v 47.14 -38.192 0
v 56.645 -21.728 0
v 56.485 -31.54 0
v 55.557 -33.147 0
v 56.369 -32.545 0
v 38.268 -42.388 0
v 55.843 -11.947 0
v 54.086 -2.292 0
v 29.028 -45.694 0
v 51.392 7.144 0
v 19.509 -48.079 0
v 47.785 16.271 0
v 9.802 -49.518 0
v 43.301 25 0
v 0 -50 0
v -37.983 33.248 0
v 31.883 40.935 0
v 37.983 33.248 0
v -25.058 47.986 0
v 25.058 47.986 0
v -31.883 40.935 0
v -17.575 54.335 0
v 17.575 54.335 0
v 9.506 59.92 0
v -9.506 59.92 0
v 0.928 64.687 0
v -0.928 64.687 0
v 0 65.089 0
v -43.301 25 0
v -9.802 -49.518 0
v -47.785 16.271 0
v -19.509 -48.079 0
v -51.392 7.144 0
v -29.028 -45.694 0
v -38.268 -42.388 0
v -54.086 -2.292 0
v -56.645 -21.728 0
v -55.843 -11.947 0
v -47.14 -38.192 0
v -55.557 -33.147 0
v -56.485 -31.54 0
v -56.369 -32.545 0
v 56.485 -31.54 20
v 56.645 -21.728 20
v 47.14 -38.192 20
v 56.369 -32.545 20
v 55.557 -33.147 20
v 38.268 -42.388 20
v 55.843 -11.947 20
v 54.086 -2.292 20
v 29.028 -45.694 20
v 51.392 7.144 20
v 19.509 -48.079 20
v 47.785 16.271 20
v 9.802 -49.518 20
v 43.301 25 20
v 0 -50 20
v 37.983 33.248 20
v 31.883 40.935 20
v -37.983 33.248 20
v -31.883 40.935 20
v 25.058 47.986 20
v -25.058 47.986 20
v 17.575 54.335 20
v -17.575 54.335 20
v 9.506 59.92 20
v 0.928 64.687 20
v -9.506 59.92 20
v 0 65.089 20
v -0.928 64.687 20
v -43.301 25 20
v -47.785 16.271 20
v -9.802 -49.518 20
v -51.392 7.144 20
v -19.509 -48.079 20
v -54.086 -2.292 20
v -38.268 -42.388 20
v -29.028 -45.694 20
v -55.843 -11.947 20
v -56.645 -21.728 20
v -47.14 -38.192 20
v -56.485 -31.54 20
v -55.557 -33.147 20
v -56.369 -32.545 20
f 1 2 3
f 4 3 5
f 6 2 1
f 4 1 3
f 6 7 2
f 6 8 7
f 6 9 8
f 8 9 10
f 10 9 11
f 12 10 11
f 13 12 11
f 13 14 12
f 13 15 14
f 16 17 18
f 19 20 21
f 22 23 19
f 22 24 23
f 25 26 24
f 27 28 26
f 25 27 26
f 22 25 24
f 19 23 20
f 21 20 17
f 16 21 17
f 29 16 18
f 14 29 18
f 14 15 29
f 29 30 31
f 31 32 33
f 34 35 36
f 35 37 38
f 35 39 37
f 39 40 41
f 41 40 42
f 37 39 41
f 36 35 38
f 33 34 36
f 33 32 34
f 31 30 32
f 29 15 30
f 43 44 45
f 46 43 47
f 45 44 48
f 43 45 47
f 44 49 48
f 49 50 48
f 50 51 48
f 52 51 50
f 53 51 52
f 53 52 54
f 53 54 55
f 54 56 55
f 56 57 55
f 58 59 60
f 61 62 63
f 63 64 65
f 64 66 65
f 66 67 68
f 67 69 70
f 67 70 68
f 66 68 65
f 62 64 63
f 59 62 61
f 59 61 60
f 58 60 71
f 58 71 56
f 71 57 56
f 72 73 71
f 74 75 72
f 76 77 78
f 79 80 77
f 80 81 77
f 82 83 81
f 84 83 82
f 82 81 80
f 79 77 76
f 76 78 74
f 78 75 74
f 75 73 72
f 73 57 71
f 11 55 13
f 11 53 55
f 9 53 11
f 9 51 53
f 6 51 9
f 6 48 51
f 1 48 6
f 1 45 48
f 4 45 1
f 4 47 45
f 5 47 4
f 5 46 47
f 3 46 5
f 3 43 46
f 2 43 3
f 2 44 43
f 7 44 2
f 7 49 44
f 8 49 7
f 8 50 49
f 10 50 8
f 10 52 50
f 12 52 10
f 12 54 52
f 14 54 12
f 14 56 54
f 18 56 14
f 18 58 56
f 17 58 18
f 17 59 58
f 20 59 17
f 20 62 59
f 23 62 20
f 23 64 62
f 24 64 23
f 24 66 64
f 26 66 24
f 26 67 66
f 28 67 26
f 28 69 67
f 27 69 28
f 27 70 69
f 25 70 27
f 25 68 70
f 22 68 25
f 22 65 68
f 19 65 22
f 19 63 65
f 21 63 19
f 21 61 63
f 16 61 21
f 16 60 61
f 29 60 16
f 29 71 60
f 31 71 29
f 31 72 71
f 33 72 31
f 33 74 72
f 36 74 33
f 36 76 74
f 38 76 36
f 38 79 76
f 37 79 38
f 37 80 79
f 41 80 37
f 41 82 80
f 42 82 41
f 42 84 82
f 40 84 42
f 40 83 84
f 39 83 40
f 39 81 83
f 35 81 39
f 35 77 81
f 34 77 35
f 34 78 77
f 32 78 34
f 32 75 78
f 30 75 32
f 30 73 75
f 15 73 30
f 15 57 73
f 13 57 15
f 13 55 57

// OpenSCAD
$fn = 64;

// 0.2 mm

wall_thickness = 1.2;
thickness = 20;

module reuleaux_box(
    diameter = 40
) {
    difference() {
        cube([diameter + (wall_thickness * 2), diameter + (wall_thickness * 2), thickness], center = true);
        cube([diameter, diameter, thickness], center = true);
    }
}

module reuleaux_polygon(
    diameter = 40,
    sides = 3
) { 
    angle = 360 / sides;
    linear_extrude(thickness)
    intersection_for(side = [0 : sides]) {
        rotate([0, 0, side * angle])      
        translate([0, diameter/2, 0])
        circle(r = diameter);
    }
}

module reuleaux_boxygon(
    diameter = 40,
    sides = 3
) {
    color("blue", alpha = 0.2)
    reuleaux_box(diameter);
    
    color("yellow")
    reuleaux_polygon(diameter, sides);
}



reuleaux_polygon(diameter = 100, sides = 3);
